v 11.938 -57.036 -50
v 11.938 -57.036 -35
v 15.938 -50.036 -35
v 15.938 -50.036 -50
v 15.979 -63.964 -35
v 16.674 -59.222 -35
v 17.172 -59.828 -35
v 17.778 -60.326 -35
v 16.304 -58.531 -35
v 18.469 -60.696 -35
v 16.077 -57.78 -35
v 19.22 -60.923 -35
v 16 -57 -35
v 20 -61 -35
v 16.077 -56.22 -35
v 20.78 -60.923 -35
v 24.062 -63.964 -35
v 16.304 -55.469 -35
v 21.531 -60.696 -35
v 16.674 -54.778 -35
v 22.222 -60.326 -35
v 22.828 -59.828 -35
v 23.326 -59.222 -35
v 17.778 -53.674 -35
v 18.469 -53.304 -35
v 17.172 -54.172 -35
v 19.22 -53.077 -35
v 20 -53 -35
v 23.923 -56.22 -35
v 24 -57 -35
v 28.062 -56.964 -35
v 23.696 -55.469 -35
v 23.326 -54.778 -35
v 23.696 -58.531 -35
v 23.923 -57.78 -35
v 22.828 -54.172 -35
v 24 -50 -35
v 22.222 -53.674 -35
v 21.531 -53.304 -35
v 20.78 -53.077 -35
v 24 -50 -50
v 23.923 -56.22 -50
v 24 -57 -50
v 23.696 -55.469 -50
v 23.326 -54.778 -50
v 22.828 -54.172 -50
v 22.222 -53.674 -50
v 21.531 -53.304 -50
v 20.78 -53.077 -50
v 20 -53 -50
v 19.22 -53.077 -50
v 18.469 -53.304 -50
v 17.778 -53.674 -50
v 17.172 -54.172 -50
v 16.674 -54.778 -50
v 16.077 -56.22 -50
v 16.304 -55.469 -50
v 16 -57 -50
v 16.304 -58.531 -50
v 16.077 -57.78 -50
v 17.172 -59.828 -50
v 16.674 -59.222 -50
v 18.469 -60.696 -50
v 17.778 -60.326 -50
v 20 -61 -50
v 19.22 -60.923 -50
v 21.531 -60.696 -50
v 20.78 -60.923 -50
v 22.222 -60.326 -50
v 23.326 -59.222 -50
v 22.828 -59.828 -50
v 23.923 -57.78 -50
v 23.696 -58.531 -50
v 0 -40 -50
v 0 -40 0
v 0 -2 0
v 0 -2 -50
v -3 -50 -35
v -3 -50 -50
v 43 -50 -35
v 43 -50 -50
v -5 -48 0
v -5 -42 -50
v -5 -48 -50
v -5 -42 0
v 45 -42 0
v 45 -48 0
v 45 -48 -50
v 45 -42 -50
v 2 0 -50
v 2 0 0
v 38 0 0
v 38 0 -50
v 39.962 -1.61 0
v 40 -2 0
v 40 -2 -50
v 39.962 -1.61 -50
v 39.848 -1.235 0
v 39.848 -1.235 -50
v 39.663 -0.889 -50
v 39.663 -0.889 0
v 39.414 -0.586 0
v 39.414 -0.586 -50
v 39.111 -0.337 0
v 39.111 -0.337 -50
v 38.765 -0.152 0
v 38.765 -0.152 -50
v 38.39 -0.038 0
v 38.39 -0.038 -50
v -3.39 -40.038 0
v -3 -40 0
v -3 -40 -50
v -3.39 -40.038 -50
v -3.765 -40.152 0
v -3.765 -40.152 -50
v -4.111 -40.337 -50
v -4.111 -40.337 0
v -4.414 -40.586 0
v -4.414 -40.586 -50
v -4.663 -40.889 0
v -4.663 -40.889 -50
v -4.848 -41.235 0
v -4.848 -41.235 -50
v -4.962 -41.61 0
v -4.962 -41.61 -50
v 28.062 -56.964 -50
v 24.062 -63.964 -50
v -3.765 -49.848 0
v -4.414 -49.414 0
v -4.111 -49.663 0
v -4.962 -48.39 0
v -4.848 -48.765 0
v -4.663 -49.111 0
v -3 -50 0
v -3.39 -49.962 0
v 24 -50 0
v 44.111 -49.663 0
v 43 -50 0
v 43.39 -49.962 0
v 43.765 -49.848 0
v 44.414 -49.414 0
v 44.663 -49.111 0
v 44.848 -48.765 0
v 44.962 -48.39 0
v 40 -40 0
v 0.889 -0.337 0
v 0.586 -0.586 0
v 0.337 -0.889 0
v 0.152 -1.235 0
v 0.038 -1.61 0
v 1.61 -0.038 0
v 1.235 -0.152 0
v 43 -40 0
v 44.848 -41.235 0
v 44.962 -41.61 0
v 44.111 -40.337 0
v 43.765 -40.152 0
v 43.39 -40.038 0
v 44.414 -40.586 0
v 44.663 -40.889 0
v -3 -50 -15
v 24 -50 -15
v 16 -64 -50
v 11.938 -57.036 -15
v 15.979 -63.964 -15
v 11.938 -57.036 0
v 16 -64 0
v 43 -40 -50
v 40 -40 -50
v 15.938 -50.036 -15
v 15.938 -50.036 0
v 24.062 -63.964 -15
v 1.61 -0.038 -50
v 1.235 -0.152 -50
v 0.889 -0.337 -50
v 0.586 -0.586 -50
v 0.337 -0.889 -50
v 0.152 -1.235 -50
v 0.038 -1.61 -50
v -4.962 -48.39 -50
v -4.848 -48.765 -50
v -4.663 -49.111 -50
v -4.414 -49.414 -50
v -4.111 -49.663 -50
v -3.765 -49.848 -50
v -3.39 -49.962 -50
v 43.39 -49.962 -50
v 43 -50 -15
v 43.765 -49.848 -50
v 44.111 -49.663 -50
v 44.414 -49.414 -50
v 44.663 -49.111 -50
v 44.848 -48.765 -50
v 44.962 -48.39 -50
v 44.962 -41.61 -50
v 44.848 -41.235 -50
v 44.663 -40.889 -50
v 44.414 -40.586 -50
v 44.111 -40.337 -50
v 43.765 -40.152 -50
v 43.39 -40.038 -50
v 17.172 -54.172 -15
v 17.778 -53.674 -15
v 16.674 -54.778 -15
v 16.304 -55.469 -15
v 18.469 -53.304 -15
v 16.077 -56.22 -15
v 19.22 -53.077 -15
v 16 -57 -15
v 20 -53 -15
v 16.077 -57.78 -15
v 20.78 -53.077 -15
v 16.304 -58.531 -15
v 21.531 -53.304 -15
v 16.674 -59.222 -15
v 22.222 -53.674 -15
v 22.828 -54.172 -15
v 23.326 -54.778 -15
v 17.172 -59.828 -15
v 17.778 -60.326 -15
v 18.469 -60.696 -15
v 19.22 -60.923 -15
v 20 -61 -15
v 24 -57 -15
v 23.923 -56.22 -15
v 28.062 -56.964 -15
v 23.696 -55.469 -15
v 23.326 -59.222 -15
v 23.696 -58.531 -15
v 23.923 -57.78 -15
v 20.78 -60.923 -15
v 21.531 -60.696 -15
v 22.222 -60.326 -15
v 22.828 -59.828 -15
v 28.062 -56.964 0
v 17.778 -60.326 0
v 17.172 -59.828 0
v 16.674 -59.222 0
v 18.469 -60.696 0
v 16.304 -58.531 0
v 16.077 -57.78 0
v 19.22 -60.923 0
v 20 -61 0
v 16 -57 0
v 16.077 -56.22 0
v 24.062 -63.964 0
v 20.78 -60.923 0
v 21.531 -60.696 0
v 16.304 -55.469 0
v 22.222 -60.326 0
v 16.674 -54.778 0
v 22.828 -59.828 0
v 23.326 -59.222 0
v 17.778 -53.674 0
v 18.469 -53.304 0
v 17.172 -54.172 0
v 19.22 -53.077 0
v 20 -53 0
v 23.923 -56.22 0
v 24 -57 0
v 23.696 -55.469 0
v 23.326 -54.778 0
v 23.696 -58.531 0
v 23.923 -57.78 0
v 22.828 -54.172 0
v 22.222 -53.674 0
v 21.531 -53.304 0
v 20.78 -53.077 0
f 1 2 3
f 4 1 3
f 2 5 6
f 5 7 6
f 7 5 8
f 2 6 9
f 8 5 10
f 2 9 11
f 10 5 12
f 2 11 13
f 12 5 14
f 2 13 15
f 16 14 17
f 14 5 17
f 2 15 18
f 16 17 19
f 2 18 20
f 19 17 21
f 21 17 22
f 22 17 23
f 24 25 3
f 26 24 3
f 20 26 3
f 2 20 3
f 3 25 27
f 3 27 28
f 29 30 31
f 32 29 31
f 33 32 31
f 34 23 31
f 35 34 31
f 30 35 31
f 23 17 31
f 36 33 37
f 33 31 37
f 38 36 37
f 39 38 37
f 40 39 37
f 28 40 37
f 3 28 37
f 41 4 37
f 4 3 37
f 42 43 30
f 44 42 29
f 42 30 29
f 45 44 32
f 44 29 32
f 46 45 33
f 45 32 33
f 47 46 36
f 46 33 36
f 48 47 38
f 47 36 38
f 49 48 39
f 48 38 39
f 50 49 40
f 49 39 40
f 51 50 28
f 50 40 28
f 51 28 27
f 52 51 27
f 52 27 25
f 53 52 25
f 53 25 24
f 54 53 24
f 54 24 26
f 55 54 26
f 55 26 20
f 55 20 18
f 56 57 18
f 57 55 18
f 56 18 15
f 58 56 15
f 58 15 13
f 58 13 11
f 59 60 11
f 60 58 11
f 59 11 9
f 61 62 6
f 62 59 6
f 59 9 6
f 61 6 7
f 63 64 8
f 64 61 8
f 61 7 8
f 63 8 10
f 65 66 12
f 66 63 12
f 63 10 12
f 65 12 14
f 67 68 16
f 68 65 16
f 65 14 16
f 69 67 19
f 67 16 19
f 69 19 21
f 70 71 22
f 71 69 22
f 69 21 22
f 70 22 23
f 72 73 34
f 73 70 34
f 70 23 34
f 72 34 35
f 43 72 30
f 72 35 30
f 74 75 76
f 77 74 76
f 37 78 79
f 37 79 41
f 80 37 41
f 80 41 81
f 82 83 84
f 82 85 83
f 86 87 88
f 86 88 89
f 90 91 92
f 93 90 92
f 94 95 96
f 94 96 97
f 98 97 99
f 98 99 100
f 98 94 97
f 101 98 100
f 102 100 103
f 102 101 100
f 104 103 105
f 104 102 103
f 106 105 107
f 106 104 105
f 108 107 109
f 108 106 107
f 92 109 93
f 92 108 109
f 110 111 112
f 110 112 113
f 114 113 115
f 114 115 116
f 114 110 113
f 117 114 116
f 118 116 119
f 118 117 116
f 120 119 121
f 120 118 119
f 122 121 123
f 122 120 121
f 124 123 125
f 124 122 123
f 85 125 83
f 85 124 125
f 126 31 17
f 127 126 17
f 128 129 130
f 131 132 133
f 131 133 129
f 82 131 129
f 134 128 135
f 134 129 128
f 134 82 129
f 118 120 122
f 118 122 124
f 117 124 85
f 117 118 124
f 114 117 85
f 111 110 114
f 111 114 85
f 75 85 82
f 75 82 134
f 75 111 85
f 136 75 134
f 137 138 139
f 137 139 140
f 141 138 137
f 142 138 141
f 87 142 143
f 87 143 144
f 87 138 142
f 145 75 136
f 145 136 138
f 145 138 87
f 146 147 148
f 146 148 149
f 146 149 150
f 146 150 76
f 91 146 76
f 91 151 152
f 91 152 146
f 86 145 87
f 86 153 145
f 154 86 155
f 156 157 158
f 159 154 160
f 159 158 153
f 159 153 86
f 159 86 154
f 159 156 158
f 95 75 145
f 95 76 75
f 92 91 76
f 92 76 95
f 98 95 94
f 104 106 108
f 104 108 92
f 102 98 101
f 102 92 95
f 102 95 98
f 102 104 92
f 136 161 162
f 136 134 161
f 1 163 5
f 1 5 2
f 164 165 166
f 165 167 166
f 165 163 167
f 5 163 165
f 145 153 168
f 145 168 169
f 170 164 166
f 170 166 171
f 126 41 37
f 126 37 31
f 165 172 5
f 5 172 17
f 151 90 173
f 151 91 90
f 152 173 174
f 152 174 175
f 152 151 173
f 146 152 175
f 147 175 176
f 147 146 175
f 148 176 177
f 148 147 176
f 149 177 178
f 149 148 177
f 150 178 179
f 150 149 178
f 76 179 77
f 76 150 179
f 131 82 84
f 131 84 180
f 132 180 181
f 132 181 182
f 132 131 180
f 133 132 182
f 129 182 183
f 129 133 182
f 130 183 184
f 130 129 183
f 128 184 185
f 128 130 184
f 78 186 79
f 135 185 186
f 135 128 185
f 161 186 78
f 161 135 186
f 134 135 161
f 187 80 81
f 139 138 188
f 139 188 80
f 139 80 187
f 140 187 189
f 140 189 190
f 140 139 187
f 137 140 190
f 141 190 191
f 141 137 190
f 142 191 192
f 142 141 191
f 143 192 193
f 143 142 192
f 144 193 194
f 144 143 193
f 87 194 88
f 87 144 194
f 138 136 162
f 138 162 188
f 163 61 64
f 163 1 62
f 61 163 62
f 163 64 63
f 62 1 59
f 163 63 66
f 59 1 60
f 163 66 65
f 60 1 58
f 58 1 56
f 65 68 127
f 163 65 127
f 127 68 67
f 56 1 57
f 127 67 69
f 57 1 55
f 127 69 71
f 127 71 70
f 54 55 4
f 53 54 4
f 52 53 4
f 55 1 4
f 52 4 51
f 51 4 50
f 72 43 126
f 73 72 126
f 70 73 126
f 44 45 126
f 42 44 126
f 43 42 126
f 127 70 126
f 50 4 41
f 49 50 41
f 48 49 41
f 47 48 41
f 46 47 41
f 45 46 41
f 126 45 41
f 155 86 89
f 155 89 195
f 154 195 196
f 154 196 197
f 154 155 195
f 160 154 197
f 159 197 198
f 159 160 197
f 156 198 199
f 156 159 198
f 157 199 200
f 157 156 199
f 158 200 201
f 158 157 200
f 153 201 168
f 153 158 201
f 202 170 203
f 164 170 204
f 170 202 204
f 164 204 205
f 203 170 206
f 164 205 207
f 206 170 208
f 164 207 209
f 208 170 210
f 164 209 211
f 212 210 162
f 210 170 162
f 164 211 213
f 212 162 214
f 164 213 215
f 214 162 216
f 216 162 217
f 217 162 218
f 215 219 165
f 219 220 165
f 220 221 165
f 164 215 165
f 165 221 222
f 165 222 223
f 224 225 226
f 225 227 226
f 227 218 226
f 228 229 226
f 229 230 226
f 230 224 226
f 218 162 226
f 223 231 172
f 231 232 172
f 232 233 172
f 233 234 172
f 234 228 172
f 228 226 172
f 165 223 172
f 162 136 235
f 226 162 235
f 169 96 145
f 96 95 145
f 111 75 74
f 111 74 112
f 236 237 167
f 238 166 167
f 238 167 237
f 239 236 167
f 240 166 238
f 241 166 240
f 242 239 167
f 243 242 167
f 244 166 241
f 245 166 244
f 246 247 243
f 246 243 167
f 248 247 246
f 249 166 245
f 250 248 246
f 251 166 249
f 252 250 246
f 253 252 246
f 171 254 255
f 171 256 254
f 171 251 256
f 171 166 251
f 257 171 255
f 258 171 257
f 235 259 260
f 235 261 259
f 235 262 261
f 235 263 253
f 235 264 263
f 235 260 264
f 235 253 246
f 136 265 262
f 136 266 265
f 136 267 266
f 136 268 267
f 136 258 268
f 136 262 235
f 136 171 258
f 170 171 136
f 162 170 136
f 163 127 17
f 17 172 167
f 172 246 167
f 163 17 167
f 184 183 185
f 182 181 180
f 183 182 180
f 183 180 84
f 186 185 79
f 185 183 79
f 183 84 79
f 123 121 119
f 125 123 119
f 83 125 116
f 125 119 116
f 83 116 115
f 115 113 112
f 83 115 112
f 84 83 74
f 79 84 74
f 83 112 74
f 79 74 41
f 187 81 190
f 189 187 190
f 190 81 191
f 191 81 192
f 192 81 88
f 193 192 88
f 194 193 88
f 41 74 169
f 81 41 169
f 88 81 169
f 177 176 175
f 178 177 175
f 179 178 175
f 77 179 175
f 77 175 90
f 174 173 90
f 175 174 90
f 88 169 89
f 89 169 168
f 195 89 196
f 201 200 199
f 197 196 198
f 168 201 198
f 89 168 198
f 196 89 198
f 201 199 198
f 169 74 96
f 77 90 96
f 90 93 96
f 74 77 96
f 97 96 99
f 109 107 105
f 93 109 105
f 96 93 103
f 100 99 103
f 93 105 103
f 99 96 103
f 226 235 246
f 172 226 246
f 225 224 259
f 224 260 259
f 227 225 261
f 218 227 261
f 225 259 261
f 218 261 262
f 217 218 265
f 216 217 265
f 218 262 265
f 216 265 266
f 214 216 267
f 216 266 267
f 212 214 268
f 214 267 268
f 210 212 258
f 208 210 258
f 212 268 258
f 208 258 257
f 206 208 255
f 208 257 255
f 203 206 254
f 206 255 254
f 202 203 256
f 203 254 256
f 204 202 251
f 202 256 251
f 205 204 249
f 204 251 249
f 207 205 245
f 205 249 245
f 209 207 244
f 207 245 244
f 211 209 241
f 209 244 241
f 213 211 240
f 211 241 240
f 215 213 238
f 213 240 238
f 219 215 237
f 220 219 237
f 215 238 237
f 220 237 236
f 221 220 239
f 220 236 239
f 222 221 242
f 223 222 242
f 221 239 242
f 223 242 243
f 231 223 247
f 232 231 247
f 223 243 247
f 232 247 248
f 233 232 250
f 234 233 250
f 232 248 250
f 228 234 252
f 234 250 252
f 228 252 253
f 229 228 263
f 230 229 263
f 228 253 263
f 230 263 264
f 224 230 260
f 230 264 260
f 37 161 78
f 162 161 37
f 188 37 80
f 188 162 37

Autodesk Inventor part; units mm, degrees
ref_plane "YZ Plane" through (0, 0, 0) normal (1, 0, 0) x (0, 1, 0)
ref_plane "XZ Plane" through (0, 0, 0) normal (0, 1, 0) x (-1, 0, 0)
ref_plane "XY Plane" through (0, 0, 0) normal (0, 0, 1) x (1, 0, 0)
sketch "Sketch1" plane through (0, 0, 0) normal (0, 0, 1) x (1, 0, 0)
  line L0 (2, 0) -> (38, 0)
  line L1 (40, -2) -> (40, -40)
  line L2 (40, -40) -> (0, -40)
  line L3 (0, -40) -> (0, -2)
  line L4 (0, -40) -> (-3, -40)
  line L5 (-5, -42) -> (-5, -48)
  line L6 (-3, -50) -> (43, -50)
  line L7 (45, -48) -> (45, -42)
  line L8 (43, -40) -> (40, -40)
  arc A0 (2, 0) -> (0, -2) centre (2, -2) ccw
  arc A1 (40, -2) -> (38, 0) centre (38, -2) ccw
  arc A2 (-3, -40) -> (-5, -42) centre (-3, -42) ccw
  arc A3 (-5, -48) -> (-3, -50) centre (-3, -48) ccw
  arc A4 (45, -42) -> (43, -40) centre (43, -42) ccw
  arc A5 (43, -50) -> (45, -48) centre (43, -48) ccw
  point P0 (0, 0)
  point P1 (40, 0)
  point P2 (-5, -40)
  point P3 (-5, -50)
  point P4 (45, -50)
  point P5 (45, -40)
  dimension "d0" = 40
  dimension "d1" = 40
  dimension "d2" = 5
  dimension "d3" = 10
  dimension "d4" = 50
  dimension "d5" = 2
  dimension "d6" = 2
extrude "Extrusion1" add sketch "Sketch1" against normal blind 50
sketch "Sketch2" plane through (0, 0, 0) normal (0, 0, 1) x (1, 0, 0)
  line L0 (43, -50) -> (-3, -50) projected
  line L1 (20, -50) -> (20, -57)
  line L2 (-3, -50) -> (43, -50) projected
  circle A0 centre (20, -57) radius 4
  line L3 (24, -50) -> (28.0622, -56.9641)
  line L4 (28.0622, -56.9641) -> (24.0622, -63.9641)
  line L5 (24.0622, -63.9641) -> (16, -64)
  line L6 (16, -64) -> (11.9378, -57.0359)
  line L7 (11.9378, -57.0359) -> (15.9378, -50.0359)
  line L8 (15.9378, -50.0359) -> (24, -50)
  point P0 (0, 0)
  dimension "d9" = 7
  dimension "d10" = 8
extrude "Extrusion2" add sketch "Sketch2" against normal blind 50 contours L3 L4 L5 L6 L7 L8
sketch "Sketch3" plane through (45, -48, 0) normal (1, 0, 0) x (0, 0, -1)
  line L0 (0, 0) -> (0, -2) projected
  line L1 (0, -2) -> (15, -2)
  line L2 (0, -2) -> (50, -2) projected
  line L3 (15, -2) -> (15, -15.9641)
  line L4 (0, -15.9641) -> (50, -15.9641) projected
  line L5 (15, -15.9641) -> (35, -15.9641)
  line L6 (35, -15.9641) -> (35, -2)
  line L7 (15, -2) -> (35, -2)
  point P0 (0, 48)
  dimension "d13" = 15
  dimension "d14" = 20
extrude "Extrusion3" cut sketch "Sketch3" against normal blind 50
ref_plane "Work Plane1" through (0, 0, -25) normal (0, 0, -1) x (-1, 0, 0)
thread "Thread1" size "M8x1.25" class "6H" standard "ANSI Metric M Profile" full length
thread "Thread2" size "M8x1.25" class "6H" standard "ANSI Metric M Profile" full length
properties part number "mass"
